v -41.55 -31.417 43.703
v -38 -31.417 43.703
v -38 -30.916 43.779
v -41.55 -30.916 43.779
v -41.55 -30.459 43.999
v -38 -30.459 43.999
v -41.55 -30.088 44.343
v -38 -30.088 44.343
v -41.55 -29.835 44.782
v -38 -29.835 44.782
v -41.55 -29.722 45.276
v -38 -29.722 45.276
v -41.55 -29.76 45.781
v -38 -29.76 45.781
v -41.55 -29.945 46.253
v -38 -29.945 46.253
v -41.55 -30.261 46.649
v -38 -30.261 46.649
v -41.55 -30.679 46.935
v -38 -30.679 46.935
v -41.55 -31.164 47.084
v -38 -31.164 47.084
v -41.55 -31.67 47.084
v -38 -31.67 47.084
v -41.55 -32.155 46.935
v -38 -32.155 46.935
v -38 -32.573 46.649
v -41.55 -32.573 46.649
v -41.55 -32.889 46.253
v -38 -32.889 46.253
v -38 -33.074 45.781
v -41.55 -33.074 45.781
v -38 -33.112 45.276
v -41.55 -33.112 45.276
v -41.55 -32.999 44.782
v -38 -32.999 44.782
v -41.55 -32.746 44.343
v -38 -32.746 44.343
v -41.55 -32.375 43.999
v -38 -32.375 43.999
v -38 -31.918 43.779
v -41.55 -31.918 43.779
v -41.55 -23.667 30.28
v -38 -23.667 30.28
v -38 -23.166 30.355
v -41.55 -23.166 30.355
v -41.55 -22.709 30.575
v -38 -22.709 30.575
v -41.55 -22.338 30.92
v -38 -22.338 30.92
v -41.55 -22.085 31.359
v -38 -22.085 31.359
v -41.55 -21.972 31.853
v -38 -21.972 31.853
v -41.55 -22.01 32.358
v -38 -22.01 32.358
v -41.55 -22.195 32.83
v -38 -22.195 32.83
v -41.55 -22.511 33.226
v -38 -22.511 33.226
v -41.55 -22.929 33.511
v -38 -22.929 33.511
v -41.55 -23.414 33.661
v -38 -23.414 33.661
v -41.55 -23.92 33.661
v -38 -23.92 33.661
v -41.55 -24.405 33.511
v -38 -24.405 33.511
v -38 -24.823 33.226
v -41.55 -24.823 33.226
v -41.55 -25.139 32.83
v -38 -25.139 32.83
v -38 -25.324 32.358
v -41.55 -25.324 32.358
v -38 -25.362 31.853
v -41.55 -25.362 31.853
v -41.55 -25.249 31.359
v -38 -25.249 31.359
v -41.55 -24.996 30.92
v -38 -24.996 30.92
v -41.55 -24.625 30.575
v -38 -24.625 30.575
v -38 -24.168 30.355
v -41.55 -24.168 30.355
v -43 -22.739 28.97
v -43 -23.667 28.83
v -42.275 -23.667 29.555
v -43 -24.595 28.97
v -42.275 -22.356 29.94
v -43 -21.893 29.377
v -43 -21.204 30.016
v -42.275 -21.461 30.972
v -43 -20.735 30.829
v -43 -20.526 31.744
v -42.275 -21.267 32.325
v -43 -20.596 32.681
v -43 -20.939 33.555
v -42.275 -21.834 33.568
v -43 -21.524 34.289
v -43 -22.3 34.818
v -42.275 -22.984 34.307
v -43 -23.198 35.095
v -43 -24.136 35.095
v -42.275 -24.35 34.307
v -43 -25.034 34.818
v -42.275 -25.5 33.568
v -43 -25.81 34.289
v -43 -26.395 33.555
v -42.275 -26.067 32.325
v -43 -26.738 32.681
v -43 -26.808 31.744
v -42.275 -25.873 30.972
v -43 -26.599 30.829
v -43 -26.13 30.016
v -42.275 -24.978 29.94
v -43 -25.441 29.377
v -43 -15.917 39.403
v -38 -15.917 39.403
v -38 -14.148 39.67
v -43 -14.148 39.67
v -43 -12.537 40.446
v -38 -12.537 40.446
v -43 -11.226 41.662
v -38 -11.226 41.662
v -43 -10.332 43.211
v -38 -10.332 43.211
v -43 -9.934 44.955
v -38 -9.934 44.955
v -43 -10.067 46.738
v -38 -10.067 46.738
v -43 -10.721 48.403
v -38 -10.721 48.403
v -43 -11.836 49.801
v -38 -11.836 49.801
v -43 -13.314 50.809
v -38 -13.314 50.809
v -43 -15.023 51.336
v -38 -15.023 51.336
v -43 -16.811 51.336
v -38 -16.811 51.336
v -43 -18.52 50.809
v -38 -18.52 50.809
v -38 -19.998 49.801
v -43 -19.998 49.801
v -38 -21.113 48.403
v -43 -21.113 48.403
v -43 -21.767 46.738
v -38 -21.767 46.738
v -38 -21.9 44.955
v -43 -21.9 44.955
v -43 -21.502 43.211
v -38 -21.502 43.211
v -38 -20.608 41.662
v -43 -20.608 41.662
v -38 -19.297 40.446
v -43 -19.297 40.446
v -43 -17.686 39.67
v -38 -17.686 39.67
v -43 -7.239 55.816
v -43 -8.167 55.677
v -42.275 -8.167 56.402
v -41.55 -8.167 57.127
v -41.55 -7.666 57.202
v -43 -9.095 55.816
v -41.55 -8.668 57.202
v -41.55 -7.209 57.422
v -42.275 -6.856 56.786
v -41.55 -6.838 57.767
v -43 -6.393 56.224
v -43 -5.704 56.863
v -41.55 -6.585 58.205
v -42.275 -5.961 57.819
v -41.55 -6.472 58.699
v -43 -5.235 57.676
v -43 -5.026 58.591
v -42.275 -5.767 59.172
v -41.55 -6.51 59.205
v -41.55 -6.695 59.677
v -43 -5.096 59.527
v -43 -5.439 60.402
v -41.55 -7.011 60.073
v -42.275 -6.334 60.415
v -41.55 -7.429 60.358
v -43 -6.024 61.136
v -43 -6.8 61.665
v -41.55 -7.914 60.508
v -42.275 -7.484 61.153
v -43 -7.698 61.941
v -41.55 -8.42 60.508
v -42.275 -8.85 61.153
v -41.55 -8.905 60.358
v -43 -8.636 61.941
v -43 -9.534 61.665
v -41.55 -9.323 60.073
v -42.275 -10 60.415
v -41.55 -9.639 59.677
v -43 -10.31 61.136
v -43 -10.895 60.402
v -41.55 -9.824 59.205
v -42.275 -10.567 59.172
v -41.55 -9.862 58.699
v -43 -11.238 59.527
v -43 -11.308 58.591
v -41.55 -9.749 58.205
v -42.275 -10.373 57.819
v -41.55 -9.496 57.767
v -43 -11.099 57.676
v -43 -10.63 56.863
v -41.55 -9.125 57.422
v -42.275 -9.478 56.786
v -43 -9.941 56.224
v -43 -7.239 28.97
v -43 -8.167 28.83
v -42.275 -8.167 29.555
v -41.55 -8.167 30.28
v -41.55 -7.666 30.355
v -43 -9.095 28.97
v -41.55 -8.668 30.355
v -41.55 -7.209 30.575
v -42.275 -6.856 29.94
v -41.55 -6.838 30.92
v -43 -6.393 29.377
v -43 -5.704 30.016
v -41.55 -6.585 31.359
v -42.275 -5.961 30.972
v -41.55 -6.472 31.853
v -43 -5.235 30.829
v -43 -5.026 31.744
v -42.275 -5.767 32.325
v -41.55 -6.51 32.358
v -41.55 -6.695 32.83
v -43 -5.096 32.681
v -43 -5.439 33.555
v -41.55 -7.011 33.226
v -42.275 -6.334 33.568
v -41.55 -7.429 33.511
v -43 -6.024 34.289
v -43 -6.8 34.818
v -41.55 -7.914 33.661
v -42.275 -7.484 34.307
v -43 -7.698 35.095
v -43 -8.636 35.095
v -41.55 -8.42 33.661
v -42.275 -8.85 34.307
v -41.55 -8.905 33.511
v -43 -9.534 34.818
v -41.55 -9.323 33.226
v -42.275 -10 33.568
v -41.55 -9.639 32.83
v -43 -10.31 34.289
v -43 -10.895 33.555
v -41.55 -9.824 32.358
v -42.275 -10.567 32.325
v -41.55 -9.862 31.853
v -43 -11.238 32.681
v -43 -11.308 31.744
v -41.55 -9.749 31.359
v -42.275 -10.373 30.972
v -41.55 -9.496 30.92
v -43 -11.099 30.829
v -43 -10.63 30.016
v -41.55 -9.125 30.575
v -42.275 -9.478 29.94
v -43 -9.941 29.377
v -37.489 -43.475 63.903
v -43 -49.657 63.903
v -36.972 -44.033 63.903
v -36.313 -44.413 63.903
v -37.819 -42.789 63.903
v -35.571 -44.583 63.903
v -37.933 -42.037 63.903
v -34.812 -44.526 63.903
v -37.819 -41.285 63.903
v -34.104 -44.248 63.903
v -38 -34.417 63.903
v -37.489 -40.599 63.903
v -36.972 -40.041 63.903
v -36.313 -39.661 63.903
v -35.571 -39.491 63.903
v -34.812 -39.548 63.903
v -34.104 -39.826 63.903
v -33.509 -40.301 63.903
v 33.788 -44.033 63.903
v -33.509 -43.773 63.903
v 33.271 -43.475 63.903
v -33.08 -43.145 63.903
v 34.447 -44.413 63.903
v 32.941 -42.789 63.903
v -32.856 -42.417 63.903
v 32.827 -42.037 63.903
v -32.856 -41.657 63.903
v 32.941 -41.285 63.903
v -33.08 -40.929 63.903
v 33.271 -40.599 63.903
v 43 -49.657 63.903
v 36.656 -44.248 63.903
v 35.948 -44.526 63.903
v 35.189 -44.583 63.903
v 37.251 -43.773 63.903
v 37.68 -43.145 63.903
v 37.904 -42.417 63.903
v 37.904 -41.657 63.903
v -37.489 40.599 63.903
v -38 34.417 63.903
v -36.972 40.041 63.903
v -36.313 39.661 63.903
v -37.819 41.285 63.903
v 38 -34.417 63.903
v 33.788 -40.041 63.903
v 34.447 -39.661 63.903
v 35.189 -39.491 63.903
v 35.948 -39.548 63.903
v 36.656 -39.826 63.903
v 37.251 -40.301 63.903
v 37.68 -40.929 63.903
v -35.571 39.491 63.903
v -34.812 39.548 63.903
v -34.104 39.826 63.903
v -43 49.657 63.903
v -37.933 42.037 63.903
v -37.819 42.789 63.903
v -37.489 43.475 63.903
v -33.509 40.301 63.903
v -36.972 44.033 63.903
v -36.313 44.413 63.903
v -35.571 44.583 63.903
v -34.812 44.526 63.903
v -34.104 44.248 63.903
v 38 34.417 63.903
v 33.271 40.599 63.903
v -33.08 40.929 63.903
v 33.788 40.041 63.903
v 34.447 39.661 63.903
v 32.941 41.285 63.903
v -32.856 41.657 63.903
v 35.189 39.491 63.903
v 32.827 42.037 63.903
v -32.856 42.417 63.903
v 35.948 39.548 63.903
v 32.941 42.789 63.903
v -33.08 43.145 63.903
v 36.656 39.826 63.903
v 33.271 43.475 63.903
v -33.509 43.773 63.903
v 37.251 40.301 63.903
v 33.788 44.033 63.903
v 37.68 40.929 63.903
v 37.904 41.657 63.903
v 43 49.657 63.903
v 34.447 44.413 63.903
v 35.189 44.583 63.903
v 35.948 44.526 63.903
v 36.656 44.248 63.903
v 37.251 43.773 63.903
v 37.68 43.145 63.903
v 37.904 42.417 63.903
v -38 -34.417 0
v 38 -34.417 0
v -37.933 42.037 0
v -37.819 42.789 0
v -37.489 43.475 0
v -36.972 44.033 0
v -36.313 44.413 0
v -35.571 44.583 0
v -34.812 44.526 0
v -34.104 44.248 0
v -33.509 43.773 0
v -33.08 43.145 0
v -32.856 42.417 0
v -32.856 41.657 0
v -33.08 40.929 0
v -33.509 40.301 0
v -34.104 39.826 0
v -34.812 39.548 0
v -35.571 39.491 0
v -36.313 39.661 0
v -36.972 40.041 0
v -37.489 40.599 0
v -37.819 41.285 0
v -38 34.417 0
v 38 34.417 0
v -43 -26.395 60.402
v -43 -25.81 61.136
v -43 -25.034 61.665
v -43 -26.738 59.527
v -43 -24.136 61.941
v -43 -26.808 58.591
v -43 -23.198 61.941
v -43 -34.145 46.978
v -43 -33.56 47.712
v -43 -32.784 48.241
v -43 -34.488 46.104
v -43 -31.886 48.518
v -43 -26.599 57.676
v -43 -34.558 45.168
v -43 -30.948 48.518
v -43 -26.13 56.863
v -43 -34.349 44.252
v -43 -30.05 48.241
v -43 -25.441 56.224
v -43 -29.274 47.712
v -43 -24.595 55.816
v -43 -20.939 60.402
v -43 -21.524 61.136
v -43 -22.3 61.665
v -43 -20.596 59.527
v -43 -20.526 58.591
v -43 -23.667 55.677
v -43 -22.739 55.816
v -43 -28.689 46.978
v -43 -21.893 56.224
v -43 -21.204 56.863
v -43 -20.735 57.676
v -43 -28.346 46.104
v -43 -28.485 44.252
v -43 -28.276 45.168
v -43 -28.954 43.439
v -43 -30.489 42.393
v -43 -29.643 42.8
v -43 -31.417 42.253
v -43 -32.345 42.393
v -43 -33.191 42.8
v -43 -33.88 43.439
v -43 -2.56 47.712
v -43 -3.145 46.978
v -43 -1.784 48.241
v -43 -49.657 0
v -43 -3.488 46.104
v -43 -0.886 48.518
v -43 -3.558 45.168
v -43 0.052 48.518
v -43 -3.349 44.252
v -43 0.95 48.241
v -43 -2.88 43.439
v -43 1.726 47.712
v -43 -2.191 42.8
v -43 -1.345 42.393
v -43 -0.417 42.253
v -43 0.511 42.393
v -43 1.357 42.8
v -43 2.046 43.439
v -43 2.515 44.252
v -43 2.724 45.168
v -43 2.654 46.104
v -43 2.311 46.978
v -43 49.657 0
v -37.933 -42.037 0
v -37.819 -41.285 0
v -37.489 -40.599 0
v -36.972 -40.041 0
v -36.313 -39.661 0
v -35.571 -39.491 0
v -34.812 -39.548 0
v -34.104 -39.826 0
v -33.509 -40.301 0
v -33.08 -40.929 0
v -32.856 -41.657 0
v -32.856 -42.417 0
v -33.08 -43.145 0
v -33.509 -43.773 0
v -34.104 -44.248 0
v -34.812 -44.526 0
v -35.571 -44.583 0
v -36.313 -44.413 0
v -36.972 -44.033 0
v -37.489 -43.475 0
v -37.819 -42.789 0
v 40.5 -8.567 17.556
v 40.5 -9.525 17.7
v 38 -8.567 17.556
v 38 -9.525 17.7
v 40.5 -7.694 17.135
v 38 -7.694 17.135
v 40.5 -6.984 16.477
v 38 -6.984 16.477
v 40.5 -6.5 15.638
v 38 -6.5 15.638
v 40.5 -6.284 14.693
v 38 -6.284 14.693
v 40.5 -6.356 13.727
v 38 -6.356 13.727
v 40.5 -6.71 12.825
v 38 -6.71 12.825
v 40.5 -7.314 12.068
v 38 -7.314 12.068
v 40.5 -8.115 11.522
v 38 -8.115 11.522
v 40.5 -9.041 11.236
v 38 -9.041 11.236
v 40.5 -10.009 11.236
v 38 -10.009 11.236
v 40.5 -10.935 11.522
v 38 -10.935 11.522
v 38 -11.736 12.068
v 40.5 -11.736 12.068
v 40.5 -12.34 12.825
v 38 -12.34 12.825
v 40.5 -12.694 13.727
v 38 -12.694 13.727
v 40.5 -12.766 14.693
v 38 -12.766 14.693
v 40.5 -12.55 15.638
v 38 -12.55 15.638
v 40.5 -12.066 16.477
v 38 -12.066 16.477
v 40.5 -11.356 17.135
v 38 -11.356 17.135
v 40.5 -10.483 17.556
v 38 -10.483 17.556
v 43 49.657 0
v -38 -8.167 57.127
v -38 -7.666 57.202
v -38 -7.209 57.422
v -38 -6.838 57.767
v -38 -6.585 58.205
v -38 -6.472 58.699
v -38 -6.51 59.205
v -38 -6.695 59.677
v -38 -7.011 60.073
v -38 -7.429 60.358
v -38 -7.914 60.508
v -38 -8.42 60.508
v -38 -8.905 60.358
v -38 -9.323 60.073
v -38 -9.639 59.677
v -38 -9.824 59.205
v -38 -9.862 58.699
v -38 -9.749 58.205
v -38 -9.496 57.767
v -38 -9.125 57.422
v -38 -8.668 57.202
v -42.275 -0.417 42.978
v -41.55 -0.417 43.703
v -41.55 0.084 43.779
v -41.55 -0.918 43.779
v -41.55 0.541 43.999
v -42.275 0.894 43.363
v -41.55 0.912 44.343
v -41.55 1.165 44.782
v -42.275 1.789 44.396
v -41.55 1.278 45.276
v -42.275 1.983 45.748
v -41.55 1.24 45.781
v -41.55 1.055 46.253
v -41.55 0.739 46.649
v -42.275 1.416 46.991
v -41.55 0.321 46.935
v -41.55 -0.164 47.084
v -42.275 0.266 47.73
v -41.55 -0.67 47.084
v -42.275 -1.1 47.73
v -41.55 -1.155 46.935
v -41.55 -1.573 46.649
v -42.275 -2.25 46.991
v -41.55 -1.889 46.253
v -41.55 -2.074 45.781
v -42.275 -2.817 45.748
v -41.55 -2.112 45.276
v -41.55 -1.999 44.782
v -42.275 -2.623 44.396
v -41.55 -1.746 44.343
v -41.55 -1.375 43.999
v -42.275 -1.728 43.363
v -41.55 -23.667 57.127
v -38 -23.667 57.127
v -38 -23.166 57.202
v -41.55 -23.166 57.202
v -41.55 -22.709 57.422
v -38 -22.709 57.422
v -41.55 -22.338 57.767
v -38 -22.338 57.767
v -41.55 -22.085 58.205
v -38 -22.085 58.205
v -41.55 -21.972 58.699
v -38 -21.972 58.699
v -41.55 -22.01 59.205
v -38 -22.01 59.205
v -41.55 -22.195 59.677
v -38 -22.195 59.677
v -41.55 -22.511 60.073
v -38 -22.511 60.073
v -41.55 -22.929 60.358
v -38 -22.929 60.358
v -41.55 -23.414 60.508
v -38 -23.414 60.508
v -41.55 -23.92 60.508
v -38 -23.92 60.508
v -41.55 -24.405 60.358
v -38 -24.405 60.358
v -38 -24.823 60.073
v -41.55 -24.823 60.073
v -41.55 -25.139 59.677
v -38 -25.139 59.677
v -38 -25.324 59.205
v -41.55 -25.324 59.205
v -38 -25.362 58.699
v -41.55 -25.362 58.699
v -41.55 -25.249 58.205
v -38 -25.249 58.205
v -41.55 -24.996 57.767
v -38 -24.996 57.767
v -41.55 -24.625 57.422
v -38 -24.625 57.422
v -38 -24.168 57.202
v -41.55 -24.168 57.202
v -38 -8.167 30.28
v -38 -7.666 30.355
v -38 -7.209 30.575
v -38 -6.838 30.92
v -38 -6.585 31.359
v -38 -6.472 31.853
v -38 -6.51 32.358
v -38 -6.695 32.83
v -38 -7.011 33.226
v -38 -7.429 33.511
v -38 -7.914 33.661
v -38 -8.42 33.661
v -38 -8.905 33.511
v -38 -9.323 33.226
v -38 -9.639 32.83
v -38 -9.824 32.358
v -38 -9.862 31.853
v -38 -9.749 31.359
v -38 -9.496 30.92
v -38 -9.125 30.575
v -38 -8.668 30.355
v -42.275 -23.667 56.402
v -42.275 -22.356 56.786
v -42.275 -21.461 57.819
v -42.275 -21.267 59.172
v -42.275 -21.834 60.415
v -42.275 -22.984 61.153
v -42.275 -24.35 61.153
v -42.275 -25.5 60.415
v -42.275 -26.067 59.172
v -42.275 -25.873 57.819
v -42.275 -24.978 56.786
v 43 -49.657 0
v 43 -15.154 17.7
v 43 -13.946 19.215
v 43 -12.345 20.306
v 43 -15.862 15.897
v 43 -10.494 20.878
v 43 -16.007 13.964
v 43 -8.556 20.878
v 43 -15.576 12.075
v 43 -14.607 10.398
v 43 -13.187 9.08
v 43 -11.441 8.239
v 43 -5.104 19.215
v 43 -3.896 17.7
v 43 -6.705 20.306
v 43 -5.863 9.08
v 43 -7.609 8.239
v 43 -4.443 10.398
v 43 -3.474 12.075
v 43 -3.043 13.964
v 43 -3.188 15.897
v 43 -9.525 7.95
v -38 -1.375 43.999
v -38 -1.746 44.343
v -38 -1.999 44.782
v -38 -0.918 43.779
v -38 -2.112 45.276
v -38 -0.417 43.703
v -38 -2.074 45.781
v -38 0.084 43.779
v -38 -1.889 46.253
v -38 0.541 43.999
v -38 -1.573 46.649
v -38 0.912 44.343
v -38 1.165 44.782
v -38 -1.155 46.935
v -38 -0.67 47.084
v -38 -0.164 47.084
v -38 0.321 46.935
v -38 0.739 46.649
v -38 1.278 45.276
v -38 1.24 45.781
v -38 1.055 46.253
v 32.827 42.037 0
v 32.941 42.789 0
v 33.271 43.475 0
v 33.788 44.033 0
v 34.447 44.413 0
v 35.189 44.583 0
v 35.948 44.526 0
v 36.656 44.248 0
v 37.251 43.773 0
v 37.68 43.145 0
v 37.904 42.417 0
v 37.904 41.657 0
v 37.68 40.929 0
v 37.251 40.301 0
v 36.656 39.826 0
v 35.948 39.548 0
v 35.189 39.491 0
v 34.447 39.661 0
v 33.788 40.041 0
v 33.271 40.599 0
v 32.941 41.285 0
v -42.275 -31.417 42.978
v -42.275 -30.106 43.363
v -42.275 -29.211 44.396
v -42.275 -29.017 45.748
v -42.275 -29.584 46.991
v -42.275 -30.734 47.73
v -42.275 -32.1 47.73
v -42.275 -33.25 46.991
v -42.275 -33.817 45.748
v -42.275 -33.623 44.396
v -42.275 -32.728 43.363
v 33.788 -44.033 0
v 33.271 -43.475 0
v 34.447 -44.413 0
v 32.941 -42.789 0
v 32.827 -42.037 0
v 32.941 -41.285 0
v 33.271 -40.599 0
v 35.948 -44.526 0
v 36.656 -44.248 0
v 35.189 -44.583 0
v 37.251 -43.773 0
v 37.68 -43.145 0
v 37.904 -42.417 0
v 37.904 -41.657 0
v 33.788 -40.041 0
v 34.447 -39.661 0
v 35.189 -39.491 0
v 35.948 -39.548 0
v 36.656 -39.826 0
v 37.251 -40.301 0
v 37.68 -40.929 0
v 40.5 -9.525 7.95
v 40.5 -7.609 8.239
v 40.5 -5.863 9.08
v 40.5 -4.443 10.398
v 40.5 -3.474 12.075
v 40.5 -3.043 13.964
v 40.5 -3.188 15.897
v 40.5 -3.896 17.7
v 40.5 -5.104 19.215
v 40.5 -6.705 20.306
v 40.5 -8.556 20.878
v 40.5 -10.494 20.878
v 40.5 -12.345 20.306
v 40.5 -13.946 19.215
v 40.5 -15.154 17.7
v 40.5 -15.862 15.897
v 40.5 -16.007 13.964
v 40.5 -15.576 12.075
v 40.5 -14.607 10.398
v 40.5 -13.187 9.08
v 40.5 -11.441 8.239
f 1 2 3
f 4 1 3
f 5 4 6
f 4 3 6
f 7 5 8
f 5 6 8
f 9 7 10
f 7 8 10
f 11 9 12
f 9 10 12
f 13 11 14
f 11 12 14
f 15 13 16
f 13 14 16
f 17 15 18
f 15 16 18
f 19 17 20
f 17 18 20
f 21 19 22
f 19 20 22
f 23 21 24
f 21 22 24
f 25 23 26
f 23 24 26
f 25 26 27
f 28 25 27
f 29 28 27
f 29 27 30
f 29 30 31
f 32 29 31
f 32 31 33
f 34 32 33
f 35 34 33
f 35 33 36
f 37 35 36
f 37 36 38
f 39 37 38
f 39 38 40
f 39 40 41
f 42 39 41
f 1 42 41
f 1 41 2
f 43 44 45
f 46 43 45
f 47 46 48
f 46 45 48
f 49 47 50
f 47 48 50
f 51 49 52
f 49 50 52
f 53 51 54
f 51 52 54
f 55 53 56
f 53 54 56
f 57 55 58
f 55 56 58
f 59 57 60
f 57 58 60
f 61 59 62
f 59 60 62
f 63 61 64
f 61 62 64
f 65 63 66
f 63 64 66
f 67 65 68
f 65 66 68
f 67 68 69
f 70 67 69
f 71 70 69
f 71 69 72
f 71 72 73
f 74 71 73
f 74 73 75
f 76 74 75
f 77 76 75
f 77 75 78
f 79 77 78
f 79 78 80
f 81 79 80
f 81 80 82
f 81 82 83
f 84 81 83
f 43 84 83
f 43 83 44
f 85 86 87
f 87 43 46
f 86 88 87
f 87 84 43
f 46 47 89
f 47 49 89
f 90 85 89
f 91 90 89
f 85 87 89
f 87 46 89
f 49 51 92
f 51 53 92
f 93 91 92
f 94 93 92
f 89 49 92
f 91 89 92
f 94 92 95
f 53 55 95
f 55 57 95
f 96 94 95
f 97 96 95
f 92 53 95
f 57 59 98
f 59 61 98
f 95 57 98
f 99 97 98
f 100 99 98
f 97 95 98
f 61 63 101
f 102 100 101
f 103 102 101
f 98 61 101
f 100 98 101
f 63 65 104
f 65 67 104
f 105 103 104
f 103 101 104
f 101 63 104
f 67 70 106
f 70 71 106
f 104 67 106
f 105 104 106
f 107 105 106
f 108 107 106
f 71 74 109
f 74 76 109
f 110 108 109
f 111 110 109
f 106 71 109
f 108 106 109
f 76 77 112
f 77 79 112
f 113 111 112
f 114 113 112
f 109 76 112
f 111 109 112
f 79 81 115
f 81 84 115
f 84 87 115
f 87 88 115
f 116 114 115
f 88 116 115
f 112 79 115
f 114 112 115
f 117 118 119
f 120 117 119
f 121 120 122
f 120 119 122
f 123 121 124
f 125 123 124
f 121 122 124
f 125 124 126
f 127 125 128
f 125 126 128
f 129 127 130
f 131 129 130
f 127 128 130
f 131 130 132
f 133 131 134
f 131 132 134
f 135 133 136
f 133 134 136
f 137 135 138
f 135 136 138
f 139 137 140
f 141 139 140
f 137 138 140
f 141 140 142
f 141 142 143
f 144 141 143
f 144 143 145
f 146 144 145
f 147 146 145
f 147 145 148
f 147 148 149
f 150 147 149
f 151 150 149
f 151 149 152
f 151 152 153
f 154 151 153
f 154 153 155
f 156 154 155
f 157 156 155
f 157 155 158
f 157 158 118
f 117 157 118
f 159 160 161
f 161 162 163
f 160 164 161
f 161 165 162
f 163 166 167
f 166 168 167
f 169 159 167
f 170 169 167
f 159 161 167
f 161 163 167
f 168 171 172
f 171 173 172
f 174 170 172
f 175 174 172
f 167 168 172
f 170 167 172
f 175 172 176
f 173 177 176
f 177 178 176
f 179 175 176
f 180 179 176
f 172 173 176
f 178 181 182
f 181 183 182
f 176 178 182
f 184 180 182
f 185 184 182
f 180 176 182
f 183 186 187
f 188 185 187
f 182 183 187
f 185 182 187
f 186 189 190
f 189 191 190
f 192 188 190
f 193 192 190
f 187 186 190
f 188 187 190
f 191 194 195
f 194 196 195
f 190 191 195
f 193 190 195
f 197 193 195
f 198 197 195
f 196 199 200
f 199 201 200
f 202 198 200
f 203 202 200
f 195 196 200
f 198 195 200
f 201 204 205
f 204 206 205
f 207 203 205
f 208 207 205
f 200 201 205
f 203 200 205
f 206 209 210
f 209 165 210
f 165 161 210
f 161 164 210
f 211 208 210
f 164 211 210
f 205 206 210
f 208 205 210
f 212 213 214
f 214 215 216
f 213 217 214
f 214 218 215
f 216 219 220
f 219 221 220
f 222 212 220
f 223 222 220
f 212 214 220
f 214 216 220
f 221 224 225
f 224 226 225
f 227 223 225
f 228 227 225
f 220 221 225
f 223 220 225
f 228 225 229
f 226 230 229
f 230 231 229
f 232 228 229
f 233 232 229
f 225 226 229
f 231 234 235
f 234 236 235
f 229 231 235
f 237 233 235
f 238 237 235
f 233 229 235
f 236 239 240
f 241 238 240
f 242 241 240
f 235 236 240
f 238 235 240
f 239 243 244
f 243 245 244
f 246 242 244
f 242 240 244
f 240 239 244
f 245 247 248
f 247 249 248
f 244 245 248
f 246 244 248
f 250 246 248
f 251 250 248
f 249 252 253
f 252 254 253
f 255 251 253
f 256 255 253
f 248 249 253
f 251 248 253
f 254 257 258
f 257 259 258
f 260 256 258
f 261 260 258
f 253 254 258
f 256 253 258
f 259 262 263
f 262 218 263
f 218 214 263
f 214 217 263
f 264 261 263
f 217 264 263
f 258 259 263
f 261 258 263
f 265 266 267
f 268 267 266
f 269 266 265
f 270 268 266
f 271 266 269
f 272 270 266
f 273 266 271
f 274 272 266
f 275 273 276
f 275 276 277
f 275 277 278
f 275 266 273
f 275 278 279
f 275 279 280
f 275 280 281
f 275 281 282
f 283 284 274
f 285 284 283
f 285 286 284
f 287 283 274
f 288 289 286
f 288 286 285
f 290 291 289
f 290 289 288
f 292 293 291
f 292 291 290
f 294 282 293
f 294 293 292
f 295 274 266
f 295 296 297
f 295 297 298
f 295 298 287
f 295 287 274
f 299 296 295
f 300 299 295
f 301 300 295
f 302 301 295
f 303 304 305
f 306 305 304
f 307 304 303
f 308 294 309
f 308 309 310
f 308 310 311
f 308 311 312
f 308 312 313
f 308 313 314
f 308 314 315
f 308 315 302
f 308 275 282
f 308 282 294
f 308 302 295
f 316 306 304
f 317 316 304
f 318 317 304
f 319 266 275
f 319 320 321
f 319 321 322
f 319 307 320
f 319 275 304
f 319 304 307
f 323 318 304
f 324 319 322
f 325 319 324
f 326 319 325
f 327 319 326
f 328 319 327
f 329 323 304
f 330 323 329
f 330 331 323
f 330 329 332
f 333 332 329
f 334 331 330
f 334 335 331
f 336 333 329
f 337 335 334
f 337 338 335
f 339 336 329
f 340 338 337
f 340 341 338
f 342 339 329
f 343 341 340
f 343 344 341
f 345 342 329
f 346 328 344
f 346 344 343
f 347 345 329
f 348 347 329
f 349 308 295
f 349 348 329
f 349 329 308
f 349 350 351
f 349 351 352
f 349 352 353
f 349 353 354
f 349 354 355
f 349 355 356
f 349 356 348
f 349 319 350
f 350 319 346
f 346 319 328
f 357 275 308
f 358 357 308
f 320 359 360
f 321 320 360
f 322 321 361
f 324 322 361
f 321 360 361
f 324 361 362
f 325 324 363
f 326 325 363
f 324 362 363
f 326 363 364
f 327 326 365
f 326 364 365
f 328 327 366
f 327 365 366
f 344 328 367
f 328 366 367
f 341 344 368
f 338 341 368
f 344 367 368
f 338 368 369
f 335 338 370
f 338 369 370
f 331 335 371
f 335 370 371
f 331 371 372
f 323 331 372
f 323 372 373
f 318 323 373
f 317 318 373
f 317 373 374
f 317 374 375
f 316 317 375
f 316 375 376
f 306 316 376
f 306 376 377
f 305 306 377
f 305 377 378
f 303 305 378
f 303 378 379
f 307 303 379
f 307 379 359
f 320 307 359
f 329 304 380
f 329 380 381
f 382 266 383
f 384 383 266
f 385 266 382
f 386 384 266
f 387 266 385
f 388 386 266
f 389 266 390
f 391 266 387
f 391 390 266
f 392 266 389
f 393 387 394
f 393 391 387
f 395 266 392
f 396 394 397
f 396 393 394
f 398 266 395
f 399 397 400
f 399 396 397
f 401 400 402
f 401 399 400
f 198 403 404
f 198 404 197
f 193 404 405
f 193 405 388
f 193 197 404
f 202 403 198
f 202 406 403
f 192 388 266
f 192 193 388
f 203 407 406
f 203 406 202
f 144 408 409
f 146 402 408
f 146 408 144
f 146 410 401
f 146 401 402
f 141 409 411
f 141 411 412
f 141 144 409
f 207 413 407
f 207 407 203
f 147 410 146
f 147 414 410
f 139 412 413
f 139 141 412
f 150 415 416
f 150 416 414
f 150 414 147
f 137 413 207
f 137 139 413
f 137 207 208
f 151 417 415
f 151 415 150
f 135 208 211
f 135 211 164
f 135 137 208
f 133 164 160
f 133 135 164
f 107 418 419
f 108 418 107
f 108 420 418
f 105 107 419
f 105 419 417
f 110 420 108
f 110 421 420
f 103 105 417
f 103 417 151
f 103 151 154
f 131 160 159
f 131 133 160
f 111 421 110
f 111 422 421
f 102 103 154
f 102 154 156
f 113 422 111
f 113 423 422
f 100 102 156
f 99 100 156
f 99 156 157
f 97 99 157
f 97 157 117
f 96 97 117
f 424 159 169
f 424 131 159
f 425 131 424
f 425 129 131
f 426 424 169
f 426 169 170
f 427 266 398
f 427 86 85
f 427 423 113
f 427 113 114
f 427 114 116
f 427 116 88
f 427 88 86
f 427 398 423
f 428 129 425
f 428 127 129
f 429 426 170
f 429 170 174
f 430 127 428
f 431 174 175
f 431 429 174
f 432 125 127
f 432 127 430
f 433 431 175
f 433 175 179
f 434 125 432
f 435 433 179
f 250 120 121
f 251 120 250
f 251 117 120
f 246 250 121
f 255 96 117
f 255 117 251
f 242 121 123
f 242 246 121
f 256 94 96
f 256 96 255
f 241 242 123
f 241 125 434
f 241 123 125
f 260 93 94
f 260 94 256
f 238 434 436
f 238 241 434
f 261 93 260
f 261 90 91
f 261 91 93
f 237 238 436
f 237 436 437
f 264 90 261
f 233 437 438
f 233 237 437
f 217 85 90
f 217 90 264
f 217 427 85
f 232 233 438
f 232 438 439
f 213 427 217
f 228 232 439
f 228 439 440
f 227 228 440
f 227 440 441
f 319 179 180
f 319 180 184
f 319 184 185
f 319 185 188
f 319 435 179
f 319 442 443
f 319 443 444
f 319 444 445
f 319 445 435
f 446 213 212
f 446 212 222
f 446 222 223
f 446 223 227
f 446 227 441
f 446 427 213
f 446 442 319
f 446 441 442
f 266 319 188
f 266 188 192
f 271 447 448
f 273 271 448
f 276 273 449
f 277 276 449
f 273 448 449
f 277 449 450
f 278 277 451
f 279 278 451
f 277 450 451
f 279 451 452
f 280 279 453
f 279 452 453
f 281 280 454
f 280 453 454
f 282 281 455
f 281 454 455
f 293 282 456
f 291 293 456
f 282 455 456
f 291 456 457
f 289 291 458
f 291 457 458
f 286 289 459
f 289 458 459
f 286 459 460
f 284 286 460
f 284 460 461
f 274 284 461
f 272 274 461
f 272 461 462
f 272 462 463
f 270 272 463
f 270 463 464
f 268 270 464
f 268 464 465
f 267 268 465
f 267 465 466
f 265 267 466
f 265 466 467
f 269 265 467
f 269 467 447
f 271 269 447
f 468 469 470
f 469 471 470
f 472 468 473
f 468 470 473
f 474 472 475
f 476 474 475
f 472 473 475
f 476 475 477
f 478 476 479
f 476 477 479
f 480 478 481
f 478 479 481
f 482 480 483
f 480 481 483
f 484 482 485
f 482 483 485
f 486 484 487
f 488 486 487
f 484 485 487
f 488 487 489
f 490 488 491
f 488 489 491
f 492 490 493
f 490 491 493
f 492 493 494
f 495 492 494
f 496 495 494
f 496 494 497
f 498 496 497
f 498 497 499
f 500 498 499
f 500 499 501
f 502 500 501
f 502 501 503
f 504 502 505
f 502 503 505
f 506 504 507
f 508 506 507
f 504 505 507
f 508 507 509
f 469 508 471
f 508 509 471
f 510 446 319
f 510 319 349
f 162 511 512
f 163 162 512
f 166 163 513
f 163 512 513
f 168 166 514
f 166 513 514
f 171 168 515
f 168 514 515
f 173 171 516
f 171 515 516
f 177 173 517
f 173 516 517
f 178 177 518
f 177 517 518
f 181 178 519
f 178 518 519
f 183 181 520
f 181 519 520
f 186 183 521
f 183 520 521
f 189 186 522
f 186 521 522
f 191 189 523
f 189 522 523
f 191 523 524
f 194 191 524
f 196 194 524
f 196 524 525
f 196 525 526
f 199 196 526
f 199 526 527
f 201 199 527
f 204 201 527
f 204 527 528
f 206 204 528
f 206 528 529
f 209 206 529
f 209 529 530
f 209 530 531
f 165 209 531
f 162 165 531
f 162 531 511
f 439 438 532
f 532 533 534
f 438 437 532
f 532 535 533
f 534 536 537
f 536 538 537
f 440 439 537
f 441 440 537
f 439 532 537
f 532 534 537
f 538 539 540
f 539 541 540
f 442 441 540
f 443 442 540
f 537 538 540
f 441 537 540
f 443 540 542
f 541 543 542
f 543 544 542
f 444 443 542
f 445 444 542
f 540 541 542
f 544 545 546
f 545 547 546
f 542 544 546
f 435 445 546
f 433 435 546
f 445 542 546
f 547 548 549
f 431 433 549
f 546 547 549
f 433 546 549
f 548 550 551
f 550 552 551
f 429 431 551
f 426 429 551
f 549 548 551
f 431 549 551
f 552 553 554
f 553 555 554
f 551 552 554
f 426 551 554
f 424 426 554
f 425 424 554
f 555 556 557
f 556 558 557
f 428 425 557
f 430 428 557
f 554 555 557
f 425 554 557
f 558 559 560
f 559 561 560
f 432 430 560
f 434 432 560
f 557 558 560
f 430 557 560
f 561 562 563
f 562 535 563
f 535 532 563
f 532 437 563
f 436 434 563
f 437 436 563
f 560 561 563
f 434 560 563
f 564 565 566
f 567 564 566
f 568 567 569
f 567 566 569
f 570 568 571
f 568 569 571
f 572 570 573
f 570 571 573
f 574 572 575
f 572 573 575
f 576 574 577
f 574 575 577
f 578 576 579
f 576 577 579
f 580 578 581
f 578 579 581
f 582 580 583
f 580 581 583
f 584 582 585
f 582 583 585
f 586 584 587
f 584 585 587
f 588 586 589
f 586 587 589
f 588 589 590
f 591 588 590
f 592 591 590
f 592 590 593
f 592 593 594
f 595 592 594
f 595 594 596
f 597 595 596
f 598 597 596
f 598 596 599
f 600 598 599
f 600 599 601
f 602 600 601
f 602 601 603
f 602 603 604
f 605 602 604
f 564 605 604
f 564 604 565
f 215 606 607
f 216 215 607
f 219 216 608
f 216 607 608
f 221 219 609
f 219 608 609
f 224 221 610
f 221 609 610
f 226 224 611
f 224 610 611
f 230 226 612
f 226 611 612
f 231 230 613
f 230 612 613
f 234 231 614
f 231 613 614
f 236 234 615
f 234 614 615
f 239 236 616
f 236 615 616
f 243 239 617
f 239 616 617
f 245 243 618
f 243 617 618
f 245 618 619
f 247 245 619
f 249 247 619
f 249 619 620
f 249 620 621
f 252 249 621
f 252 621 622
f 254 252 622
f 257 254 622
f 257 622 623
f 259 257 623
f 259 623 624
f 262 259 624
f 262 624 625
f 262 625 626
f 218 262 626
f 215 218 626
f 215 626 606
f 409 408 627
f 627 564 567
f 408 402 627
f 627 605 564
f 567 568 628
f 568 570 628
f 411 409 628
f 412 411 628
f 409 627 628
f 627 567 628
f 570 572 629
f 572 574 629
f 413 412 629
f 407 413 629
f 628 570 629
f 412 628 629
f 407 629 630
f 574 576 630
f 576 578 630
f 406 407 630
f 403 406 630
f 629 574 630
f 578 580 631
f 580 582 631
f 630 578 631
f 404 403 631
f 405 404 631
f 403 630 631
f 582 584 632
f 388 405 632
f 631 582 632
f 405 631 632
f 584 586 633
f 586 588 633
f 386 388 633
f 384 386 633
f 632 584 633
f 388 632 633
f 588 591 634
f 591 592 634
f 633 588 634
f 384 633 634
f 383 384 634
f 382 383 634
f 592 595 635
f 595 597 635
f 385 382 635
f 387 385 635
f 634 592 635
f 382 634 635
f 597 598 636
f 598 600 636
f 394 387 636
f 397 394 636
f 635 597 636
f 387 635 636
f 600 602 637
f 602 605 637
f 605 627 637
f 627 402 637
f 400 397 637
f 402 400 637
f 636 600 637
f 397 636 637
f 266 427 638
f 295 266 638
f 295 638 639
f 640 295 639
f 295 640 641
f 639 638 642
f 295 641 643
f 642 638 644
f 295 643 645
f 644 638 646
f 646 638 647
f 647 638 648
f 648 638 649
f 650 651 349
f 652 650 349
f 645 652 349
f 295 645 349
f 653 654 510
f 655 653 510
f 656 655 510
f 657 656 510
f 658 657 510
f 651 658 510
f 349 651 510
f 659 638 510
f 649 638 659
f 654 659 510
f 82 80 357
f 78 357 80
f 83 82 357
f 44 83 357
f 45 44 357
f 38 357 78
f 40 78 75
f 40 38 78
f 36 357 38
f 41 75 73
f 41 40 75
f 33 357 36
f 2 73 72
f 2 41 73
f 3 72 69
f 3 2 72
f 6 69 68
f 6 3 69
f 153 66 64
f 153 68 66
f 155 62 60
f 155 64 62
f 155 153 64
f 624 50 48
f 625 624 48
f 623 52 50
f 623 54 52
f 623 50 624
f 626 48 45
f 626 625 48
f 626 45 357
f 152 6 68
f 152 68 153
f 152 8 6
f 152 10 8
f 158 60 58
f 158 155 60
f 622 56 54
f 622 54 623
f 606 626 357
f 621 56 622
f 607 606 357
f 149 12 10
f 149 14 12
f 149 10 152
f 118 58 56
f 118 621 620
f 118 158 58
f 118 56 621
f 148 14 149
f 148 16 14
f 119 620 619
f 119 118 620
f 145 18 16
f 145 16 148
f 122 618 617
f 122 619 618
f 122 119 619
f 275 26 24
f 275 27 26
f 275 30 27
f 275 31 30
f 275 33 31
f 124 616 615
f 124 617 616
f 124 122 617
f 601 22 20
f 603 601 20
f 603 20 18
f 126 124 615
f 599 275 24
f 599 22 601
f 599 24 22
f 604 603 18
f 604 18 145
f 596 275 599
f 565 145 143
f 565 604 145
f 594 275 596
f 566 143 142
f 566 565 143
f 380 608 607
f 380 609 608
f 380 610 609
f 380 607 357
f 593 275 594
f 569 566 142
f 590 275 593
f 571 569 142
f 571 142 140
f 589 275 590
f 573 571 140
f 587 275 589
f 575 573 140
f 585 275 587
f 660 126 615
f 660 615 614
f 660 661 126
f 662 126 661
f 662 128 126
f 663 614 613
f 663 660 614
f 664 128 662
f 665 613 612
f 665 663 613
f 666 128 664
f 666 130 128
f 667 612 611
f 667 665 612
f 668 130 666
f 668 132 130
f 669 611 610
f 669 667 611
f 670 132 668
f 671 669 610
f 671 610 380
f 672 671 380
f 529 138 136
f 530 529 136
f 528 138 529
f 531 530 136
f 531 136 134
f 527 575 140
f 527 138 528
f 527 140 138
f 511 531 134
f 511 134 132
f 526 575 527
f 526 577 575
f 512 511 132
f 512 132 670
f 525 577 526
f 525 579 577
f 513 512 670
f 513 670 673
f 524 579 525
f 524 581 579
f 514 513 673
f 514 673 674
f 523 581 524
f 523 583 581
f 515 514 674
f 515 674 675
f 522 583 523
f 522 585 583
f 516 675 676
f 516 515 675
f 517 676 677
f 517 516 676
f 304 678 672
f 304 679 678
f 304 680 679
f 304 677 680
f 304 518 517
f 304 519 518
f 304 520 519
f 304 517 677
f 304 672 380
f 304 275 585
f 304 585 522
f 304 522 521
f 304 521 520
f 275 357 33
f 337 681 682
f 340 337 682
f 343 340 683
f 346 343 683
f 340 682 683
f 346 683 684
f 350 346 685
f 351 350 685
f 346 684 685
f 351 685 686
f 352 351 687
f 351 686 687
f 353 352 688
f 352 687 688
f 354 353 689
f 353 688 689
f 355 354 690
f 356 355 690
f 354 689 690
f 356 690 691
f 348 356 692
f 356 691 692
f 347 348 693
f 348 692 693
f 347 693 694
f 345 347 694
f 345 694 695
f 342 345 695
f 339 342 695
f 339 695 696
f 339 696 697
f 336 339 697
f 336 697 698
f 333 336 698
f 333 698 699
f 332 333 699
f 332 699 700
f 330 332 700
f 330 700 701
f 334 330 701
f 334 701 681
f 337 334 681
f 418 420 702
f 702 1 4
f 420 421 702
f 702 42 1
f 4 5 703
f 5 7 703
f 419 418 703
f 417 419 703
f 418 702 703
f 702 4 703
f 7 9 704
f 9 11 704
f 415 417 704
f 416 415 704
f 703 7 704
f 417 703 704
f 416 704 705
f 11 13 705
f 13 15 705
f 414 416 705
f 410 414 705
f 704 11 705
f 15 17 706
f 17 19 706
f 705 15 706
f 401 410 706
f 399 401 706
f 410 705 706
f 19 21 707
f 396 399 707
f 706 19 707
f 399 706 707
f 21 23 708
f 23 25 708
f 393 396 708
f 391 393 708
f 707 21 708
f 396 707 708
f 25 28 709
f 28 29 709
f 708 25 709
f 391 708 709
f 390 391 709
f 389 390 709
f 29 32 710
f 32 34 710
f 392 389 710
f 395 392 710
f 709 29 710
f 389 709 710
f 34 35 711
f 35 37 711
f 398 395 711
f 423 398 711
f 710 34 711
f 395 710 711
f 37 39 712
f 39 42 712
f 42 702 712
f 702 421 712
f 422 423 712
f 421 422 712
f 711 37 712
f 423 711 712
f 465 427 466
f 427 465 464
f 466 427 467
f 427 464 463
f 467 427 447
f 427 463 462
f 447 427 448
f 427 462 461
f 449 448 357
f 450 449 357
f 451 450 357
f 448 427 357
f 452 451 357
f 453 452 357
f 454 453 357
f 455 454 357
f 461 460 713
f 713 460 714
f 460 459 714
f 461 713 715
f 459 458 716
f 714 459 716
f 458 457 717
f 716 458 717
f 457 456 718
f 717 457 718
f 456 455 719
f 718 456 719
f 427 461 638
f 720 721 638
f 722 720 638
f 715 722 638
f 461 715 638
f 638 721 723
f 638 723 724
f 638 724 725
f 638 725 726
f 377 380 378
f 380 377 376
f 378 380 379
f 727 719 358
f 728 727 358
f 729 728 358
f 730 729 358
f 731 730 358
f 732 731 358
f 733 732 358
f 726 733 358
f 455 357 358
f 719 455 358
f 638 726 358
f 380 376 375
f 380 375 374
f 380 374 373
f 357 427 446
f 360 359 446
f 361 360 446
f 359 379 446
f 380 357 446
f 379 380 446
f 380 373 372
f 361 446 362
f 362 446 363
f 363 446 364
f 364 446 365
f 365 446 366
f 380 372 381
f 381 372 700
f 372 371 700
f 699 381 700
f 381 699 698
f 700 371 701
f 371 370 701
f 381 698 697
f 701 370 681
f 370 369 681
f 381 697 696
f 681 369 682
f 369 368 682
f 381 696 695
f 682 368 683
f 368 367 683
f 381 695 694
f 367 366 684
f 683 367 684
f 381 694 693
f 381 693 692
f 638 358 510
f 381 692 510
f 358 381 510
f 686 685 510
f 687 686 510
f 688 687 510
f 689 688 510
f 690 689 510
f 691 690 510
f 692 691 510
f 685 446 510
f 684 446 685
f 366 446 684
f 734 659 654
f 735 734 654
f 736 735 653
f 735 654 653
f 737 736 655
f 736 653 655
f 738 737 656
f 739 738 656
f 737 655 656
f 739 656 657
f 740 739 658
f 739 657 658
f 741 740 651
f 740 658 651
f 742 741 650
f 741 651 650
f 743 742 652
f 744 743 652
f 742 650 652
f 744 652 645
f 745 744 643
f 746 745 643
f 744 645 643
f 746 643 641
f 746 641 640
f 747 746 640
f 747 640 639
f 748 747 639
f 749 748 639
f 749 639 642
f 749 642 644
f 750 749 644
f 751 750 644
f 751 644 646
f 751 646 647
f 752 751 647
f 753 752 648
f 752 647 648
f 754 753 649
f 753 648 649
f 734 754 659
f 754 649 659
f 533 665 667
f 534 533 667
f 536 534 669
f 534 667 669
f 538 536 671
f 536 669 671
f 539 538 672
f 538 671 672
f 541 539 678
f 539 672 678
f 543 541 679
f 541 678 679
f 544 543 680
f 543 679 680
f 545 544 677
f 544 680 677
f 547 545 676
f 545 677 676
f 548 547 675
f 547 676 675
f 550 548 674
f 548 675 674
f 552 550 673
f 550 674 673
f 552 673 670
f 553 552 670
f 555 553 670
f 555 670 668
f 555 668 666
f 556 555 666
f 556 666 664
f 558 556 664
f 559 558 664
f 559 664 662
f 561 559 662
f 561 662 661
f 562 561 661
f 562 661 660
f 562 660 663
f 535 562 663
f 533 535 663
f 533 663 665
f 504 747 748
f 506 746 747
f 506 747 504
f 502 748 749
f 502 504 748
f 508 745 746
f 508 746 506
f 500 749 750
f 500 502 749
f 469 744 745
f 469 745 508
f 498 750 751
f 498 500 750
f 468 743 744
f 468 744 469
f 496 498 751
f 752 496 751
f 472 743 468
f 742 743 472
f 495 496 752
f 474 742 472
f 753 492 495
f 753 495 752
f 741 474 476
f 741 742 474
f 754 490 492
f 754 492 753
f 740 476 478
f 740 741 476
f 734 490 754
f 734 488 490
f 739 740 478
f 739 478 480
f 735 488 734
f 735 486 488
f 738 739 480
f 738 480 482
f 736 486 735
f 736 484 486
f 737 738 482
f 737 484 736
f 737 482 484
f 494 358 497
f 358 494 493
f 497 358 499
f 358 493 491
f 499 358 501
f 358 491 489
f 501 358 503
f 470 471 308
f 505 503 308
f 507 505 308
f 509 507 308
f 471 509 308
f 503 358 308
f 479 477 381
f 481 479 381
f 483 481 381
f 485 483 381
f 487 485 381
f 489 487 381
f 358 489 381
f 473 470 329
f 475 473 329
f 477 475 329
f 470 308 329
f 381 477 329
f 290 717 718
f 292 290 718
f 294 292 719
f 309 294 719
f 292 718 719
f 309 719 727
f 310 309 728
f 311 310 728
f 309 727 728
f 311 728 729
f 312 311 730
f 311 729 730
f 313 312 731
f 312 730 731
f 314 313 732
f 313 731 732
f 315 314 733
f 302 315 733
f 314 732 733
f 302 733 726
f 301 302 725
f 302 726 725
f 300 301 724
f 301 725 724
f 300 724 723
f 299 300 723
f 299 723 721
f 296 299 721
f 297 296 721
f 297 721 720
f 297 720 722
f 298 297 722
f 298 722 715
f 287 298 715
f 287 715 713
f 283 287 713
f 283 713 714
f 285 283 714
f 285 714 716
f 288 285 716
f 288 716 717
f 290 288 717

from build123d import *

# Parameters (mm, degrees)
SKETCH1_W                                       = 85.999999704
SKETCH1_H                                       = 99.314
BOSS_EXTRUDE1_DEPTH                             = 63.903125051
SKETCH2_W                                       = 75.999999892
SKETCH2_H                                       = 68.834
CUT_EXTRUDE1_DEPTH                              = 92.642932229
F_6_5_6_5_DIAMETER_HOLE1_D                      = 6.5
F_6_5_6_5_DIAMETER_HOLE1_DEPTH                  = 4.999999906
F_12_0_12_DIAMETER_HOLE1_D                      = 12
F_12_0_12_DIAMETER_HOLE1_DEPTH                  = 4.999999906
CSK_FOR_M3_FLAT_HEAD_MACHINE_SCREW1_D           = 3.4
CSK_FOR_M3_FLAT_HEAD_MACHINE_SCREW1_DEPTH       = 4.999999906
CSK_FOR_M3_FLAT_HEAD_MACHINE_SCREW1_CSINK_D     = 6.3
CSK_FOR_M3_FLAT_HEAD_MACHINE_SCREW1_CSINK_ANGLE = 90
F_10_CLEARANCE_HOLE1_D                          = 5.1054
SKETCH12_R                                      = 6.499999954
CUT_EXTRUDE2_DEPTH                              = 2.499999953


with BuildPart() as part:
    # Sketch1 → Boss-Extrude1 (new body)
    with BuildSketch(Plane.XY):
        Rectangle(SKETCH1_W, SKETCH1_H)
    extrude(amount=BOSS_EXTRUDE1_DEPTH)

    # Sketch2 → Cut-Extrude1 (cut, through all)
    with BuildSketch(Plane.XY.offset(63.903125051)):
        Rectangle(SKETCH2_W, SKETCH2_H)
    extrude(amount=-CUT_EXTRUDE1_DEPTH, mode=Mode.SUBTRACT)

    # Ø6.5 (6.5) Diameter Hole1
    with Locations(Plane(origin=(42.999999852, 0, 0), x_dir=(0, 0, -1), z_dir=(1, 0, 0))):
        with Locations((-14.450199954, -9.525)):
            Hole(F_6_5_6_5_DIAMETER_HOLE1_D / 2, depth=F_6_5_6_5_DIAMETER_HOLE1_DEPTH)

    # Ø12.0 (12) Diameter Hole1
    with Locations(Plane.ZY.offset(42.999999852)):
        with Locations((45.403125094, -15.917000043)):
            Hole(F_12_0_12_DIAMETER_HOLE1_D / 2, depth=F_12_0_12_DIAMETER_HOLE1_DEPTH)

    # CSK for M3 Flat Head Machine Screw1
    with Locations(Plane.ZY.offset(42.999999852)):
        with Locations((45.403125094, -0.417000055), (58.826518842, -8.167000049), (58.826518842, -23.667000037), (45.403125094, -31.417000031), (31.979731346, -23.667000037), (31.979731346, -8.167000049)):
            CounterSinkHole(CSK_FOR_M3_FLAT_HEAD_MACHINE_SCREW1_D / 2, CSK_FOR_M3_FLAT_HEAD_MACHINE_SCREW1_CSINK_D / 2, depth=CSK_FOR_M3_FLAT_HEAD_MACHINE_SCREW1_DEPTH, counter_sink_angle=CSK_FOR_M3_FLAT_HEAD_MACHINE_SCREW1_CSINK_ANGLE)

    # #10 Clearance Hole1 (through all)
    with Locations(Plane.XY.offset(63.903125051)):
        with Locations((-35.379999852, 42.037), (35.379999852, 42.037), (-35.379999852, -42.037), (35.379999852, -42.037)):
            Hole(F_10_CLEARANCE_HOLE1_D / 2)

    # Sketch12 → Cut-Extrude2 (cut)
    with BuildSketch(Plane(origin=(42.999999852, 0, 0), x_dir=(0, 0, -1), z_dir=(1, 0, 0))):
        with Locations((-14.450199954, -9.525)):
            Circle(SKETCH12_R)
    extrude(amount=-CUT_EXTRUDE2_DEPTH, mode=Mode.SUBTRACT)


solid = part.part
